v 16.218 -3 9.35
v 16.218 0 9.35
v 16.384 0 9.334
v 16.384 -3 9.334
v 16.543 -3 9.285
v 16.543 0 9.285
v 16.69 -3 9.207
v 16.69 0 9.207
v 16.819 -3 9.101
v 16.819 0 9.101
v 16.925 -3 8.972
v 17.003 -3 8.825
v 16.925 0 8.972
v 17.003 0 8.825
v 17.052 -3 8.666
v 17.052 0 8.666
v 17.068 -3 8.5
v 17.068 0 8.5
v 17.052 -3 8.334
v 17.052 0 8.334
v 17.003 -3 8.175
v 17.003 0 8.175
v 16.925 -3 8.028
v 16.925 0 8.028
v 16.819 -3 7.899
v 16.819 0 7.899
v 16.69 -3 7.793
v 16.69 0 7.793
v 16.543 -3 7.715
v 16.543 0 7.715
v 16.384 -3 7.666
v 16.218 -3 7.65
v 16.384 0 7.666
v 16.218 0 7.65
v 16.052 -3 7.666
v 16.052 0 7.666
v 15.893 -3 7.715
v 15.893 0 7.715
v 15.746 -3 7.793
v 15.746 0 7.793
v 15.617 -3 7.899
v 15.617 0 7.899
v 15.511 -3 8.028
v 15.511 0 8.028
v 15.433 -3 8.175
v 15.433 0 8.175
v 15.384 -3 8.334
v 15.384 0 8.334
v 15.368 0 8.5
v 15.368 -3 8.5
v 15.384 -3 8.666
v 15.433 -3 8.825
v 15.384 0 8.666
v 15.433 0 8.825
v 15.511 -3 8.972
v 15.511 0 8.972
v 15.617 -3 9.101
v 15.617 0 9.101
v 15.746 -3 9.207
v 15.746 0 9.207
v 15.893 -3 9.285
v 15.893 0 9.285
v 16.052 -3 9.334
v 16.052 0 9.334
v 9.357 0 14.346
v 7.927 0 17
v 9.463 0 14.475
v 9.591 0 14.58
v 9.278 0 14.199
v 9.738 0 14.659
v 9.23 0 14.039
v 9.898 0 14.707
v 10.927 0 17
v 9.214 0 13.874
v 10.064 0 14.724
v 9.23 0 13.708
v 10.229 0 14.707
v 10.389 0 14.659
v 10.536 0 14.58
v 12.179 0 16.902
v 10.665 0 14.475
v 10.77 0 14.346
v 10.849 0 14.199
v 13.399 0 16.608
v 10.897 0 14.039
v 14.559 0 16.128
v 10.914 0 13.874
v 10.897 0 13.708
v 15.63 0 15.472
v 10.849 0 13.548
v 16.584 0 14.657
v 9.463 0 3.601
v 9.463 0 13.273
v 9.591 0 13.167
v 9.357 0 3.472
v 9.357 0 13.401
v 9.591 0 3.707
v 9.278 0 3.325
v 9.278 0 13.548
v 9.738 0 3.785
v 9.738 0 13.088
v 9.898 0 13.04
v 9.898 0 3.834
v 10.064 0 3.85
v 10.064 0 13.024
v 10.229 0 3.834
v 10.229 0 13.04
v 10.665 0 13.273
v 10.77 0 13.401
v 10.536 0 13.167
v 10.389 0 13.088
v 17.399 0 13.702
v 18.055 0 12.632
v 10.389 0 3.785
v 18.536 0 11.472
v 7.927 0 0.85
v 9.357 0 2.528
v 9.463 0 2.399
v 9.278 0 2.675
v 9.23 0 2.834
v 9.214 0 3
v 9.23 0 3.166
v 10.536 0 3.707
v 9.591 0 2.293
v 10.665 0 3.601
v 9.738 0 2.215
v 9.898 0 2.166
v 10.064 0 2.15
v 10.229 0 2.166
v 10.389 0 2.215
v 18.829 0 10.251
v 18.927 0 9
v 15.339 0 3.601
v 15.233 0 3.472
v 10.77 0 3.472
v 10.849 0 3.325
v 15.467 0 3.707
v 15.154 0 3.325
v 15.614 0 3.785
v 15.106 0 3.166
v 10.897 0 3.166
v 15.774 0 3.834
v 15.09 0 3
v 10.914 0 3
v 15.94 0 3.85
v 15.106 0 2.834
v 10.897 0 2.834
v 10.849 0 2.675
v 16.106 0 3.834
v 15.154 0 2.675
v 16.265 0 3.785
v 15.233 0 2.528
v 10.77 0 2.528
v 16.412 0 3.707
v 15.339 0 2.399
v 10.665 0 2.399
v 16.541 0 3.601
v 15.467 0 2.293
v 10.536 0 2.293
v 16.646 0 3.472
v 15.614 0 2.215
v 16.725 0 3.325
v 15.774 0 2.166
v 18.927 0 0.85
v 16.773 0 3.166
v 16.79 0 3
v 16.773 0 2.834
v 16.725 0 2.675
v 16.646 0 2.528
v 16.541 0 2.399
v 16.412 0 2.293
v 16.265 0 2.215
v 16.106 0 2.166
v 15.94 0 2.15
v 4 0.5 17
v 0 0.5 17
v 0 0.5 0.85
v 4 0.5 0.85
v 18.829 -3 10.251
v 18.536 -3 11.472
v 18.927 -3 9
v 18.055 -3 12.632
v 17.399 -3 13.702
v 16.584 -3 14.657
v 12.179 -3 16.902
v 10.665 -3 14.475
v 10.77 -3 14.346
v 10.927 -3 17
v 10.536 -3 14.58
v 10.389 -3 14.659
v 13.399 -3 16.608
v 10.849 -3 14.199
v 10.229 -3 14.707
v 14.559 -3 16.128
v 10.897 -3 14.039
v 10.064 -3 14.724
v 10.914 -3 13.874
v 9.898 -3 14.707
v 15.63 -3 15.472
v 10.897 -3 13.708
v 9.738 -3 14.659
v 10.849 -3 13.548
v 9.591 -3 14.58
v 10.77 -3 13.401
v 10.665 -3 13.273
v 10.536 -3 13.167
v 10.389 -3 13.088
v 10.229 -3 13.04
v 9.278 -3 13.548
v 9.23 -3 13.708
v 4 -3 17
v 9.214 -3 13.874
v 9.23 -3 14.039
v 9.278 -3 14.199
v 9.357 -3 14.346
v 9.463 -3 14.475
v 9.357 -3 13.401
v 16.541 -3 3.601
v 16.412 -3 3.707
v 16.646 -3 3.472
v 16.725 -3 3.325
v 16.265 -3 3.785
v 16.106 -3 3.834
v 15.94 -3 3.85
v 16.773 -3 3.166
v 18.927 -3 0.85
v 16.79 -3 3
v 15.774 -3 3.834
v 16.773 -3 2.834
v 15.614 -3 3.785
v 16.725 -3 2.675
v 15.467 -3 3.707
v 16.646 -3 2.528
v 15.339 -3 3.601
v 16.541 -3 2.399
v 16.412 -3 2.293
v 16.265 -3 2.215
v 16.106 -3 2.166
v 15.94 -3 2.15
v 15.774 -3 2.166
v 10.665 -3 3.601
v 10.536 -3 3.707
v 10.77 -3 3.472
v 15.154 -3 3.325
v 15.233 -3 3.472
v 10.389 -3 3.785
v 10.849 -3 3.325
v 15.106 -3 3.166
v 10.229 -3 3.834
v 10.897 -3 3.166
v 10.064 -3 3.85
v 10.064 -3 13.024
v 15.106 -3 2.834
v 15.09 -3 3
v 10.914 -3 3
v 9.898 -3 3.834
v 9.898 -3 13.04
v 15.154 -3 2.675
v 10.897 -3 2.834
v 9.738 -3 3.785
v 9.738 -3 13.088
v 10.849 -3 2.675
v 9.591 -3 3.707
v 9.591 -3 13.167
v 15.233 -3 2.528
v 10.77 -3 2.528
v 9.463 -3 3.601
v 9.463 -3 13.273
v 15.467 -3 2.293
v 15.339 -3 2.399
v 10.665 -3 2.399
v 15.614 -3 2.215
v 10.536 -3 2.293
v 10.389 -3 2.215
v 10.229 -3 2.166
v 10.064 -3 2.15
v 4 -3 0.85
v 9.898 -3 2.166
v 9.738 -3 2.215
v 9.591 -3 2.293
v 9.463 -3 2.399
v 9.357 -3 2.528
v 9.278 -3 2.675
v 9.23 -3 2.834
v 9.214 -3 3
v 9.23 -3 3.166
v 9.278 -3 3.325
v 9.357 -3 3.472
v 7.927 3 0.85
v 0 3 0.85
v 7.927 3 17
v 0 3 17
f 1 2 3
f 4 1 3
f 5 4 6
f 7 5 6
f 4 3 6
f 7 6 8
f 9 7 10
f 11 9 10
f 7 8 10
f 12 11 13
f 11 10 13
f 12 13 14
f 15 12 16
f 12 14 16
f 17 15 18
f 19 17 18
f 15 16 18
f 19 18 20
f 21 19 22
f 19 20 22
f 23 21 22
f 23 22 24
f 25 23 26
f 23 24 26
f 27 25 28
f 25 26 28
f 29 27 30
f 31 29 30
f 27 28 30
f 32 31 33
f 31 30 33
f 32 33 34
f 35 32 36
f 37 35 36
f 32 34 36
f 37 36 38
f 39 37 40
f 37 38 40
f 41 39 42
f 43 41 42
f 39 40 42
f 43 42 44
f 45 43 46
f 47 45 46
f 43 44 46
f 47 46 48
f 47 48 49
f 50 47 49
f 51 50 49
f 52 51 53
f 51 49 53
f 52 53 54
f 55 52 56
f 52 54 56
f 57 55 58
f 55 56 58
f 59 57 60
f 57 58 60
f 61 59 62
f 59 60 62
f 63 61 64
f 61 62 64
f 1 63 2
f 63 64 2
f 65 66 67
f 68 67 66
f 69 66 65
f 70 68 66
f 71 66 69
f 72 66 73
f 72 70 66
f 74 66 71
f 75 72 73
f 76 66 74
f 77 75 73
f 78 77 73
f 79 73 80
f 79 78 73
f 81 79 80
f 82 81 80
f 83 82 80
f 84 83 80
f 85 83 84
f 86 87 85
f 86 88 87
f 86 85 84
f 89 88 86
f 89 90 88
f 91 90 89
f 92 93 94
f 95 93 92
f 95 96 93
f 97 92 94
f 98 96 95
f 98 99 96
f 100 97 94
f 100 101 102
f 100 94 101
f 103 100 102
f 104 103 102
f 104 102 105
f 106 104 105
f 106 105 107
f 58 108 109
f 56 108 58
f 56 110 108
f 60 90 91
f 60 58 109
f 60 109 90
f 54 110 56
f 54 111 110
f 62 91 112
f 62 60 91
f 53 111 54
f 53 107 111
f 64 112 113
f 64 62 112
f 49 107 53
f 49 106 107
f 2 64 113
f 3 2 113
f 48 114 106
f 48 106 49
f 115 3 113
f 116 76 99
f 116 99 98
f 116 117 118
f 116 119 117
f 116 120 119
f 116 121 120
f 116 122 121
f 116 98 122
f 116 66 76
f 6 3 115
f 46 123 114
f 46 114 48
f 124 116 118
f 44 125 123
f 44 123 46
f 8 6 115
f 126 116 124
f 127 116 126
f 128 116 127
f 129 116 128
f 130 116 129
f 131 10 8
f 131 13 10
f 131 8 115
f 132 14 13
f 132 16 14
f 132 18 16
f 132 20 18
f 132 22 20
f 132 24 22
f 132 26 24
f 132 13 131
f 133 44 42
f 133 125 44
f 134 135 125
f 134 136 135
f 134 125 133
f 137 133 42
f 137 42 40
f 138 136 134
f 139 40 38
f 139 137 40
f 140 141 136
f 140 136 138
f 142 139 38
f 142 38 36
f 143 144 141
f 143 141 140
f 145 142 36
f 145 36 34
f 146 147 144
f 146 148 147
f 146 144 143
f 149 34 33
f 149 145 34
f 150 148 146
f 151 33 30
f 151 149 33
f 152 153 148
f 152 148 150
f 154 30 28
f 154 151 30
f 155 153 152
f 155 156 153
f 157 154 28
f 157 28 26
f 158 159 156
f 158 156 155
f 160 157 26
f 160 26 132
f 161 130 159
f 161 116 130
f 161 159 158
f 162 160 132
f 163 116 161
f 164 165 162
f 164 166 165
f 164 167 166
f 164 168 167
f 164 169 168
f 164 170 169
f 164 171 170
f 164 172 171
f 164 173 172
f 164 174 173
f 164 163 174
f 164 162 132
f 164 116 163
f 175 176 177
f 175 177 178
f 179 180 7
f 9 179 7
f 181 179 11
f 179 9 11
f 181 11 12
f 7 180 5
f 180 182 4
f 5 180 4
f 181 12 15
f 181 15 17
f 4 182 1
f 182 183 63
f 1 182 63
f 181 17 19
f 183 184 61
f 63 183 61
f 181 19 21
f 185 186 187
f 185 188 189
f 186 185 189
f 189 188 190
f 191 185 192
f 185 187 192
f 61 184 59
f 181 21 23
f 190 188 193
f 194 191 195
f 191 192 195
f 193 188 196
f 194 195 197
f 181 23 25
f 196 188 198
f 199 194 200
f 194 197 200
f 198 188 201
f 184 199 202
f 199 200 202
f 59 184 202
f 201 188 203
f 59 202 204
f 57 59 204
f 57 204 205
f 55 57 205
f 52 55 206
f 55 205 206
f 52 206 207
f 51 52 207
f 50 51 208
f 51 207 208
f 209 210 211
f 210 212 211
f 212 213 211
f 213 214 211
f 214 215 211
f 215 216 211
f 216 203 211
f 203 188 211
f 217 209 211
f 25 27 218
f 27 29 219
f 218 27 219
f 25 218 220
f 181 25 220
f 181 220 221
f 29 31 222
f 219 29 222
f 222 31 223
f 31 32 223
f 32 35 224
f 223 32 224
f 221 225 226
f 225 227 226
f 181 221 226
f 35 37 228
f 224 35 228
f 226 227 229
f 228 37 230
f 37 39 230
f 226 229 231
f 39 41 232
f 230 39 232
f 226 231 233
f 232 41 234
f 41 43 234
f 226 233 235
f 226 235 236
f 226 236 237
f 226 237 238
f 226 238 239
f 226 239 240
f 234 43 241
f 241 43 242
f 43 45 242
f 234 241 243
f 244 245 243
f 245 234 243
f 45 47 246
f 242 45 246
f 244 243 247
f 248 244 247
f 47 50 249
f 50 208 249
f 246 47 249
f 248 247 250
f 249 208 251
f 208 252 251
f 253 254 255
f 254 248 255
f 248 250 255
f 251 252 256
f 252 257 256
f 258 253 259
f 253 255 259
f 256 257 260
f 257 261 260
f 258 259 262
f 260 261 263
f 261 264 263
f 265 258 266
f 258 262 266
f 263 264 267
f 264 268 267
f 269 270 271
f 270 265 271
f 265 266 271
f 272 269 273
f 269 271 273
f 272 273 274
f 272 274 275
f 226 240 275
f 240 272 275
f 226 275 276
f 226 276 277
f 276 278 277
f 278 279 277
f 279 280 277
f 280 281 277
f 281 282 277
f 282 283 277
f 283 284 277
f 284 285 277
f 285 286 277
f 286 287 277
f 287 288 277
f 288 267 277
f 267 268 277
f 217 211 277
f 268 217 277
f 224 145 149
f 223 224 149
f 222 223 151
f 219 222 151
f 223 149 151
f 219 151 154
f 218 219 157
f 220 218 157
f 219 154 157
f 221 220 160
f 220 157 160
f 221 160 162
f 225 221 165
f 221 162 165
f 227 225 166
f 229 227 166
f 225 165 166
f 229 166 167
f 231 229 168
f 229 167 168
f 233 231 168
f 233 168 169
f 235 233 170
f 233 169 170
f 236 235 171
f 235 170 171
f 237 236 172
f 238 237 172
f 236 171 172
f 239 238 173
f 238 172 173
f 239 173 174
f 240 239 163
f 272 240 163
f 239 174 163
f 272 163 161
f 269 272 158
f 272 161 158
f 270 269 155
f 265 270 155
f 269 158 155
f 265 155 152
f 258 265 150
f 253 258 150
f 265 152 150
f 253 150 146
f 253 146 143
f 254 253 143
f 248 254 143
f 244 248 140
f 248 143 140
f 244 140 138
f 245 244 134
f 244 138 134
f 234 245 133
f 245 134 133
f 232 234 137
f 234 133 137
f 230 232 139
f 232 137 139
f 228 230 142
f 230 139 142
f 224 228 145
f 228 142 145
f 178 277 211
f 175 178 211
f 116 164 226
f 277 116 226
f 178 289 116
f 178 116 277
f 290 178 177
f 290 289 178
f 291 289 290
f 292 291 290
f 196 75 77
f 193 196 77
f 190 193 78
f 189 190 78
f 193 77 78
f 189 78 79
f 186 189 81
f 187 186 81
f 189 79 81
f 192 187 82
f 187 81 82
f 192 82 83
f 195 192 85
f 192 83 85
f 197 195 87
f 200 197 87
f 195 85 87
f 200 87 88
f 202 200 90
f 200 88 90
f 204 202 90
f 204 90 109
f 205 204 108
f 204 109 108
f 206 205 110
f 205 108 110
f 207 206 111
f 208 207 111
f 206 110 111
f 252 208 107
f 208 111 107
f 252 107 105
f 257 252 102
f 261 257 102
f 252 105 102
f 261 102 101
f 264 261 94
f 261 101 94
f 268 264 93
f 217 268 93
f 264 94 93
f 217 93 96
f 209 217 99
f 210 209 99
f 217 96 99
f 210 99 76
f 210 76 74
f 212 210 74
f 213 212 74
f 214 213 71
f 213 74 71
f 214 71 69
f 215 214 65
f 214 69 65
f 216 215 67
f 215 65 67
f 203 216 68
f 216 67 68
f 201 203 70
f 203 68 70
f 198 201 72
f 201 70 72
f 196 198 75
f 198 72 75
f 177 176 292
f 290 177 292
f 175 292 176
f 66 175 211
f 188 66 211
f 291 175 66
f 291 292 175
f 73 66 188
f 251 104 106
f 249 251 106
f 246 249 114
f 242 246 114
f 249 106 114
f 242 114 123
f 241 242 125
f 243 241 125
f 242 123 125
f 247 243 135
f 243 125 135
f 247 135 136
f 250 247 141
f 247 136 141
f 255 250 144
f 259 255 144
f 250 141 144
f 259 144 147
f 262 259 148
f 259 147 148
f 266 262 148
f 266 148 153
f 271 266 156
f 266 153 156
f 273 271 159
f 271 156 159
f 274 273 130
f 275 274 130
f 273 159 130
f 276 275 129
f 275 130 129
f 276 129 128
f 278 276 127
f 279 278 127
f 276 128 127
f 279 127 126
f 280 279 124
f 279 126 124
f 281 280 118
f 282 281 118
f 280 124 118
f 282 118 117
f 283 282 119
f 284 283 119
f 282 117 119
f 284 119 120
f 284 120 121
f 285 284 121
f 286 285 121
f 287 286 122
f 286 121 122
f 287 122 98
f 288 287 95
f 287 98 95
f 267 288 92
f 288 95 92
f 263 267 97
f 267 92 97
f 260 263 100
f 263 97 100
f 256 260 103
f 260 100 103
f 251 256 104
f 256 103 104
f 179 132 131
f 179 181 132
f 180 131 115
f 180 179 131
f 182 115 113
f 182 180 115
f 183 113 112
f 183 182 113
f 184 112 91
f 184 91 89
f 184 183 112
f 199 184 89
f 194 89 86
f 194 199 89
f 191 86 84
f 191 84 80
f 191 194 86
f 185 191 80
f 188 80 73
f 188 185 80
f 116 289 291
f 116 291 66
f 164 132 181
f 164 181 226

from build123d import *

# Parameters (mm, degrees)
BOSS_EXTRUDE1_DEPTH = 20
SKETCH3_W           = 8
SKETCH3_H           = 8
CUT_EXTRUDE1_DEPTH  = 10
SKETCH4_R           = 1
CUT_EXTRUDE2_DEPTH  = 10
SKETCH5_W           = 4
SKETCH5_H           = 20
CUT_EXTRUDE3_DEPTH  = 0.5
SKETCH6_W           = 8
SKETCH6_H           = 3
BOSS_EXTRUDE2_DEPTH = 8
SKETCH4_2_R         = 1
BOSS_EXTRUDE3_DEPTH = 3
SKETCH7_W           = 20
SKETCH7_H           = 3
BOSS_EXTRUDE4_DEPTH = 3
SKETCH8_W           = 21.136904569
SKETCH8_H           = 7.074304785
CUT_EXTRUDE4_DEPTH  = 3
SKETCH9_R           = 0.85
CUT_EXTRUDE6_DEPTH  = 3
FILLET1_R           = 8
SKETCH9_5_R         = 0.85
CUT_EXTRUDE8_DEPTH  = 3
SKETCH10_W          = 22.706583138
SKETCH10_H          = 8.880510261
CUT_EXTRUDE9_DEPTH  = 0.85
SKETCH4_3_R         = 1
BOSS_EXTRUDE6_DEPTH = 3


with BuildPart() as part:
    # Sketch1 → Boss-Extrude1 (new body)
    with BuildSketch(Plane.XY):
        Polygon((0, 0), (0, 3), (4, 3), (7.927272727, 3), (7.927272727, 0), (15.927272727, 0), (15.927272727, -3), (7.927272727, -3), (4, -3), (4, 0), align=None)
    extrude(amount=BOSS_EXTRUDE1_DEPTH)

    # Sketch3 → Cut-Extrude1 (cut)
    with BuildSketch(Plane(origin=(0, 0, 0), x_dir=(1, 0, 0), z_dir=(0, 1, 0))):
        with Locations((11.927272727, -16)):
            Rectangle(SKETCH3_W, SKETCH3_H)
    extrude(amount=-CUT_EXTRUDE1_DEPTH, mode=Mode.SUBTRACT)

    # Sketch4 → Cut-Extrude2 (cut)
    with BuildSketch(Plane(origin=(0, 0, 0), x_dir=(1, 0, 0), z_dir=(0, 1, 0))):
        with Locations((11.93972935, -3)):
            Circle(SKETCH4_R)
        with Locations((11.93972935, -9)):
            Circle(SKETCH4_R)
    extrude(amount=-CUT_EXTRUDE2_DEPTH, mode=Mode.SUBTRACT)

    # Sketch5 → Cut-Extrude3 (cut)
    with BuildSketch(Plane.XZ):
        with Locations((2, 10)):
            Rectangle(SKETCH5_W, SKETCH5_H)
    extrude(amount=-CUT_EXTRUDE3_DEPTH, mode=Mode.SUBTRACT)

    # Sketch6 → Boss-Extrude2 (add)
    with BuildSketch(Plane.XY.offset(12)):
        with Locations((11.927272727, -1.5)):
            Rectangle(SKETCH6_W, SKETCH6_H)
    extrude(amount=BOSS_EXTRUDE2_DEPTH)

    # Sketch4<2> → Boss-Extrude3 (add)
    with BuildSketch(Plane(origin=(0, 0, 0), x_dir=(1, 0, 0), z_dir=(0, 1, 0))):
        with Locations((11.93972935, -9)):
            Circle(SKETCH4_2_R)
    extrude(amount=-BOSS_EXTRUDE3_DEPTH)

    # Sketch7 → Boss-Extrude4 (add)
    with BuildSketch(Plane(origin=(15.927272727, 0, 0), x_dir=(0, 0, -1), z_dir=(1, 0, 0))):
        with Locations((-10, -1.5)):
            Rectangle(SKETCH7_W, SKETCH7_H)
    extrude(amount=BOSS_EXTRUDE4_DEPTH)

    # Sketch8 → Cut-Extrude4 (cut)
    with BuildSketch(Plane.XY.offset(20)):
        with Locations((9.151850895, 0.075258561)):
            Rectangle(SKETCH8_W, SKETCH8_H)
    extrude(amount=-CUT_EXTRUDE4_DEPTH, mode=Mode.SUBTRACT)

    # Sketch9 → Cut-Extrude6 (cut)
    with BuildSketch(Plane(origin=(0, 0, 0), x_dir=(1, 0, 0), z_dir=(0, 1, 0))):
        with Locations((10.063554841, -13.873545982)):
            Circle(SKETCH9_R)
    extrude(amount=-CUT_EXTRUDE6_DEPTH, mode=Mode.SUBTRACT)

    # Fillet1
    fillet1_edges = [part.edges().sort_by_distance(p)[0] for p in [
        (18.927272727, -1.5, 17),
    ]]
    fillet(fillet1_edges, radius=FILLET1_R)

    # Sketch9<5> → Cut-Extrude8 (cut)
    with BuildSketch(Plane(origin=(0, 0, 0), x_dir=(1, 0, 0), z_dir=(0, 1, 0))):
        with Locations((10.063554841, -13.873545982)):
            Circle(SKETCH9_5_R)
        with Locations((15.93972935, -3)):
            Circle(SKETCH9_5_R)
        with Locations((16.217987441, -8.5)):
            Circle(SKETCH9_5_R)
        with Locations((10.063554841, -3)):
            Circle(SKETCH9_5_R)
    extrude(amount=-CUT_EXTRUDE8_DEPTH, mode=Mode.SUBTRACT)

    # Sketch10 → Cut-Extrude9 (cut)
    with BuildSketch(Plane(origin=(0, 0, 0), x_dir=(-1, 0, 0), z_dir=(0, 0, -1))):
        with Locations((-10.194719533, 0.225775684)):
            Rectangle(SKETCH10_W, SKETCH10_H)
    extrude(amount=-CUT_EXTRUDE9_DEPTH, mode=Mode.SUBTRACT)

    # Sketch4<3> → Boss-Extrude6 (add)
    with BuildSketch(Plane(origin=(0, 0, 0), x_dir=(1, 0, 0), z_dir=(0, 1, 0))):
        with Locations((11.93972935, -3)):
            Circle(SKETCH4_3_R)
    extrude(amount=-BOSS_EXTRUDE6_DEPTH)


solid = part.part
